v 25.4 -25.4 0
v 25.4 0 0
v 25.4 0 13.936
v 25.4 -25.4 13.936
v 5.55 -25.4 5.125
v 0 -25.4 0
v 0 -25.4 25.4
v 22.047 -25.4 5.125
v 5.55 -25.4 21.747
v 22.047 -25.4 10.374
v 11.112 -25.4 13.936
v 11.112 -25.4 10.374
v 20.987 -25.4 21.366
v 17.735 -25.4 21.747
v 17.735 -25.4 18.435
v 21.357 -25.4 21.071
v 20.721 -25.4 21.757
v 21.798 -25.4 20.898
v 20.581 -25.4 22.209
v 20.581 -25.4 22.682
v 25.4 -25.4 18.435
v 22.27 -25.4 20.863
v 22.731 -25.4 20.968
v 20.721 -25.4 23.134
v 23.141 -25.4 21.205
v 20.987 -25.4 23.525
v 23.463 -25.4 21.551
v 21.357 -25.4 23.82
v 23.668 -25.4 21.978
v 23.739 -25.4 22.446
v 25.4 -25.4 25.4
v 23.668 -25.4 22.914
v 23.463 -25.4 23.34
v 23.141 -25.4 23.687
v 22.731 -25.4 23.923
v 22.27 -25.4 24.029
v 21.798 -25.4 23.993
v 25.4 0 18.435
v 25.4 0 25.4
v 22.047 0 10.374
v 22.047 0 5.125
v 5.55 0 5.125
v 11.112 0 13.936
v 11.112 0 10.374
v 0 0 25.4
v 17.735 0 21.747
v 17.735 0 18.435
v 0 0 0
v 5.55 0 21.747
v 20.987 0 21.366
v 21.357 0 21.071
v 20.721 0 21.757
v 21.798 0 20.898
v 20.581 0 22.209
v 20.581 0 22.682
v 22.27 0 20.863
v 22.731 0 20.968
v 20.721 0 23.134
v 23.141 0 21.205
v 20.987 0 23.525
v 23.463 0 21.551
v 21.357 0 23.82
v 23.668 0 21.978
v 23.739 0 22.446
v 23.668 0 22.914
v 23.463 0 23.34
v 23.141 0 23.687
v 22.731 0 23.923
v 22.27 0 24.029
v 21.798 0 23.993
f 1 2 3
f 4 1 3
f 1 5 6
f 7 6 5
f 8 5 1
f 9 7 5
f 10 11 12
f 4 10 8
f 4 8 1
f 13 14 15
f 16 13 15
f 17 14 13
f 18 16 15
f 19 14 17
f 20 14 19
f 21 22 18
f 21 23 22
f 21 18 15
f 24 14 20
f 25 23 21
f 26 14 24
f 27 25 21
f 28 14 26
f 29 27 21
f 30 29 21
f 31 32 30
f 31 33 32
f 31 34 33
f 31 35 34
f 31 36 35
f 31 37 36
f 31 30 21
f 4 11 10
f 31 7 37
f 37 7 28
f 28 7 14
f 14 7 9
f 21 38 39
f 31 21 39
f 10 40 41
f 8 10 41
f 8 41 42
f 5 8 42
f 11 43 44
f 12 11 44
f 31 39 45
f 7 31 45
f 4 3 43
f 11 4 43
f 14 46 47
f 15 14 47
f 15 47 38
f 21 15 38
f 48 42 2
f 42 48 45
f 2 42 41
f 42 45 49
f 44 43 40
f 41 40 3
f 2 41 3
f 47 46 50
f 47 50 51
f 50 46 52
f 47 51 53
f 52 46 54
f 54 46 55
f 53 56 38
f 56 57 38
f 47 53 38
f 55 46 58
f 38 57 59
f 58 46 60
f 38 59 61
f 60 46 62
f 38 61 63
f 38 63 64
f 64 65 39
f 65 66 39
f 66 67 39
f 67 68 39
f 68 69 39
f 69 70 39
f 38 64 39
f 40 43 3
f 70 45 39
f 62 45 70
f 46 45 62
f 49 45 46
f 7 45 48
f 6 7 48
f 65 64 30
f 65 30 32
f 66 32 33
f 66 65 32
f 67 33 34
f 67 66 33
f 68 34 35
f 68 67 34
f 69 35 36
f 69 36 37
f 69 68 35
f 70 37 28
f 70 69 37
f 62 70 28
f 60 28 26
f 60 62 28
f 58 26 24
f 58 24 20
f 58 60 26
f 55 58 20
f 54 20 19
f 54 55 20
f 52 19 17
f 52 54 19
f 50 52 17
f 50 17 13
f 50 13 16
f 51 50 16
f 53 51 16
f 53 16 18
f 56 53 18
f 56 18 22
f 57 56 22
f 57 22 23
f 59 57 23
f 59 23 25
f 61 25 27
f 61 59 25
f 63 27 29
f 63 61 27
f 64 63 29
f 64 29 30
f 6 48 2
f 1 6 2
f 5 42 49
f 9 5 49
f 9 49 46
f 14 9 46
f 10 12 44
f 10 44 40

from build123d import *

# Parameters (mm, degrees)
F0_R     = 1.5875
F1_DEPTH = 25.4


with BuildPart() as f1:
    # F0 (on Front) → F1 (new body)
    with BuildSketch(Plane.XZ):
        Polygon((0, 25.4), (0, 0), (25.4, 0), (25.4, 5.125011), (22.046786, 5.125011), (5.55021, 5.125011), (5.55021, 21.746561), (17.73518, 21.746561), (17.73518, 18.43475), (25.4, 18.43475), (25.4, 25.4), align=None)
        with Locations((22.151161, 22.445666)):
            Circle(F0_R, mode=Mode.SUBTRACT)
        Polygon((22.046786, 5.125011), (25.4, 5.125011), (25.4, 9.061695), (25.4, 10.373922), (22.046786, 10.373922), align=None)
        Polygon((25.4, 10.373922), (25.4, 13.935683), (11.111556, 13.935683), (11.111556, 10.373922), (22.046786, 10.373922), align=None)
    extrude(amount=F1_DEPTH)


solid = f1.part
